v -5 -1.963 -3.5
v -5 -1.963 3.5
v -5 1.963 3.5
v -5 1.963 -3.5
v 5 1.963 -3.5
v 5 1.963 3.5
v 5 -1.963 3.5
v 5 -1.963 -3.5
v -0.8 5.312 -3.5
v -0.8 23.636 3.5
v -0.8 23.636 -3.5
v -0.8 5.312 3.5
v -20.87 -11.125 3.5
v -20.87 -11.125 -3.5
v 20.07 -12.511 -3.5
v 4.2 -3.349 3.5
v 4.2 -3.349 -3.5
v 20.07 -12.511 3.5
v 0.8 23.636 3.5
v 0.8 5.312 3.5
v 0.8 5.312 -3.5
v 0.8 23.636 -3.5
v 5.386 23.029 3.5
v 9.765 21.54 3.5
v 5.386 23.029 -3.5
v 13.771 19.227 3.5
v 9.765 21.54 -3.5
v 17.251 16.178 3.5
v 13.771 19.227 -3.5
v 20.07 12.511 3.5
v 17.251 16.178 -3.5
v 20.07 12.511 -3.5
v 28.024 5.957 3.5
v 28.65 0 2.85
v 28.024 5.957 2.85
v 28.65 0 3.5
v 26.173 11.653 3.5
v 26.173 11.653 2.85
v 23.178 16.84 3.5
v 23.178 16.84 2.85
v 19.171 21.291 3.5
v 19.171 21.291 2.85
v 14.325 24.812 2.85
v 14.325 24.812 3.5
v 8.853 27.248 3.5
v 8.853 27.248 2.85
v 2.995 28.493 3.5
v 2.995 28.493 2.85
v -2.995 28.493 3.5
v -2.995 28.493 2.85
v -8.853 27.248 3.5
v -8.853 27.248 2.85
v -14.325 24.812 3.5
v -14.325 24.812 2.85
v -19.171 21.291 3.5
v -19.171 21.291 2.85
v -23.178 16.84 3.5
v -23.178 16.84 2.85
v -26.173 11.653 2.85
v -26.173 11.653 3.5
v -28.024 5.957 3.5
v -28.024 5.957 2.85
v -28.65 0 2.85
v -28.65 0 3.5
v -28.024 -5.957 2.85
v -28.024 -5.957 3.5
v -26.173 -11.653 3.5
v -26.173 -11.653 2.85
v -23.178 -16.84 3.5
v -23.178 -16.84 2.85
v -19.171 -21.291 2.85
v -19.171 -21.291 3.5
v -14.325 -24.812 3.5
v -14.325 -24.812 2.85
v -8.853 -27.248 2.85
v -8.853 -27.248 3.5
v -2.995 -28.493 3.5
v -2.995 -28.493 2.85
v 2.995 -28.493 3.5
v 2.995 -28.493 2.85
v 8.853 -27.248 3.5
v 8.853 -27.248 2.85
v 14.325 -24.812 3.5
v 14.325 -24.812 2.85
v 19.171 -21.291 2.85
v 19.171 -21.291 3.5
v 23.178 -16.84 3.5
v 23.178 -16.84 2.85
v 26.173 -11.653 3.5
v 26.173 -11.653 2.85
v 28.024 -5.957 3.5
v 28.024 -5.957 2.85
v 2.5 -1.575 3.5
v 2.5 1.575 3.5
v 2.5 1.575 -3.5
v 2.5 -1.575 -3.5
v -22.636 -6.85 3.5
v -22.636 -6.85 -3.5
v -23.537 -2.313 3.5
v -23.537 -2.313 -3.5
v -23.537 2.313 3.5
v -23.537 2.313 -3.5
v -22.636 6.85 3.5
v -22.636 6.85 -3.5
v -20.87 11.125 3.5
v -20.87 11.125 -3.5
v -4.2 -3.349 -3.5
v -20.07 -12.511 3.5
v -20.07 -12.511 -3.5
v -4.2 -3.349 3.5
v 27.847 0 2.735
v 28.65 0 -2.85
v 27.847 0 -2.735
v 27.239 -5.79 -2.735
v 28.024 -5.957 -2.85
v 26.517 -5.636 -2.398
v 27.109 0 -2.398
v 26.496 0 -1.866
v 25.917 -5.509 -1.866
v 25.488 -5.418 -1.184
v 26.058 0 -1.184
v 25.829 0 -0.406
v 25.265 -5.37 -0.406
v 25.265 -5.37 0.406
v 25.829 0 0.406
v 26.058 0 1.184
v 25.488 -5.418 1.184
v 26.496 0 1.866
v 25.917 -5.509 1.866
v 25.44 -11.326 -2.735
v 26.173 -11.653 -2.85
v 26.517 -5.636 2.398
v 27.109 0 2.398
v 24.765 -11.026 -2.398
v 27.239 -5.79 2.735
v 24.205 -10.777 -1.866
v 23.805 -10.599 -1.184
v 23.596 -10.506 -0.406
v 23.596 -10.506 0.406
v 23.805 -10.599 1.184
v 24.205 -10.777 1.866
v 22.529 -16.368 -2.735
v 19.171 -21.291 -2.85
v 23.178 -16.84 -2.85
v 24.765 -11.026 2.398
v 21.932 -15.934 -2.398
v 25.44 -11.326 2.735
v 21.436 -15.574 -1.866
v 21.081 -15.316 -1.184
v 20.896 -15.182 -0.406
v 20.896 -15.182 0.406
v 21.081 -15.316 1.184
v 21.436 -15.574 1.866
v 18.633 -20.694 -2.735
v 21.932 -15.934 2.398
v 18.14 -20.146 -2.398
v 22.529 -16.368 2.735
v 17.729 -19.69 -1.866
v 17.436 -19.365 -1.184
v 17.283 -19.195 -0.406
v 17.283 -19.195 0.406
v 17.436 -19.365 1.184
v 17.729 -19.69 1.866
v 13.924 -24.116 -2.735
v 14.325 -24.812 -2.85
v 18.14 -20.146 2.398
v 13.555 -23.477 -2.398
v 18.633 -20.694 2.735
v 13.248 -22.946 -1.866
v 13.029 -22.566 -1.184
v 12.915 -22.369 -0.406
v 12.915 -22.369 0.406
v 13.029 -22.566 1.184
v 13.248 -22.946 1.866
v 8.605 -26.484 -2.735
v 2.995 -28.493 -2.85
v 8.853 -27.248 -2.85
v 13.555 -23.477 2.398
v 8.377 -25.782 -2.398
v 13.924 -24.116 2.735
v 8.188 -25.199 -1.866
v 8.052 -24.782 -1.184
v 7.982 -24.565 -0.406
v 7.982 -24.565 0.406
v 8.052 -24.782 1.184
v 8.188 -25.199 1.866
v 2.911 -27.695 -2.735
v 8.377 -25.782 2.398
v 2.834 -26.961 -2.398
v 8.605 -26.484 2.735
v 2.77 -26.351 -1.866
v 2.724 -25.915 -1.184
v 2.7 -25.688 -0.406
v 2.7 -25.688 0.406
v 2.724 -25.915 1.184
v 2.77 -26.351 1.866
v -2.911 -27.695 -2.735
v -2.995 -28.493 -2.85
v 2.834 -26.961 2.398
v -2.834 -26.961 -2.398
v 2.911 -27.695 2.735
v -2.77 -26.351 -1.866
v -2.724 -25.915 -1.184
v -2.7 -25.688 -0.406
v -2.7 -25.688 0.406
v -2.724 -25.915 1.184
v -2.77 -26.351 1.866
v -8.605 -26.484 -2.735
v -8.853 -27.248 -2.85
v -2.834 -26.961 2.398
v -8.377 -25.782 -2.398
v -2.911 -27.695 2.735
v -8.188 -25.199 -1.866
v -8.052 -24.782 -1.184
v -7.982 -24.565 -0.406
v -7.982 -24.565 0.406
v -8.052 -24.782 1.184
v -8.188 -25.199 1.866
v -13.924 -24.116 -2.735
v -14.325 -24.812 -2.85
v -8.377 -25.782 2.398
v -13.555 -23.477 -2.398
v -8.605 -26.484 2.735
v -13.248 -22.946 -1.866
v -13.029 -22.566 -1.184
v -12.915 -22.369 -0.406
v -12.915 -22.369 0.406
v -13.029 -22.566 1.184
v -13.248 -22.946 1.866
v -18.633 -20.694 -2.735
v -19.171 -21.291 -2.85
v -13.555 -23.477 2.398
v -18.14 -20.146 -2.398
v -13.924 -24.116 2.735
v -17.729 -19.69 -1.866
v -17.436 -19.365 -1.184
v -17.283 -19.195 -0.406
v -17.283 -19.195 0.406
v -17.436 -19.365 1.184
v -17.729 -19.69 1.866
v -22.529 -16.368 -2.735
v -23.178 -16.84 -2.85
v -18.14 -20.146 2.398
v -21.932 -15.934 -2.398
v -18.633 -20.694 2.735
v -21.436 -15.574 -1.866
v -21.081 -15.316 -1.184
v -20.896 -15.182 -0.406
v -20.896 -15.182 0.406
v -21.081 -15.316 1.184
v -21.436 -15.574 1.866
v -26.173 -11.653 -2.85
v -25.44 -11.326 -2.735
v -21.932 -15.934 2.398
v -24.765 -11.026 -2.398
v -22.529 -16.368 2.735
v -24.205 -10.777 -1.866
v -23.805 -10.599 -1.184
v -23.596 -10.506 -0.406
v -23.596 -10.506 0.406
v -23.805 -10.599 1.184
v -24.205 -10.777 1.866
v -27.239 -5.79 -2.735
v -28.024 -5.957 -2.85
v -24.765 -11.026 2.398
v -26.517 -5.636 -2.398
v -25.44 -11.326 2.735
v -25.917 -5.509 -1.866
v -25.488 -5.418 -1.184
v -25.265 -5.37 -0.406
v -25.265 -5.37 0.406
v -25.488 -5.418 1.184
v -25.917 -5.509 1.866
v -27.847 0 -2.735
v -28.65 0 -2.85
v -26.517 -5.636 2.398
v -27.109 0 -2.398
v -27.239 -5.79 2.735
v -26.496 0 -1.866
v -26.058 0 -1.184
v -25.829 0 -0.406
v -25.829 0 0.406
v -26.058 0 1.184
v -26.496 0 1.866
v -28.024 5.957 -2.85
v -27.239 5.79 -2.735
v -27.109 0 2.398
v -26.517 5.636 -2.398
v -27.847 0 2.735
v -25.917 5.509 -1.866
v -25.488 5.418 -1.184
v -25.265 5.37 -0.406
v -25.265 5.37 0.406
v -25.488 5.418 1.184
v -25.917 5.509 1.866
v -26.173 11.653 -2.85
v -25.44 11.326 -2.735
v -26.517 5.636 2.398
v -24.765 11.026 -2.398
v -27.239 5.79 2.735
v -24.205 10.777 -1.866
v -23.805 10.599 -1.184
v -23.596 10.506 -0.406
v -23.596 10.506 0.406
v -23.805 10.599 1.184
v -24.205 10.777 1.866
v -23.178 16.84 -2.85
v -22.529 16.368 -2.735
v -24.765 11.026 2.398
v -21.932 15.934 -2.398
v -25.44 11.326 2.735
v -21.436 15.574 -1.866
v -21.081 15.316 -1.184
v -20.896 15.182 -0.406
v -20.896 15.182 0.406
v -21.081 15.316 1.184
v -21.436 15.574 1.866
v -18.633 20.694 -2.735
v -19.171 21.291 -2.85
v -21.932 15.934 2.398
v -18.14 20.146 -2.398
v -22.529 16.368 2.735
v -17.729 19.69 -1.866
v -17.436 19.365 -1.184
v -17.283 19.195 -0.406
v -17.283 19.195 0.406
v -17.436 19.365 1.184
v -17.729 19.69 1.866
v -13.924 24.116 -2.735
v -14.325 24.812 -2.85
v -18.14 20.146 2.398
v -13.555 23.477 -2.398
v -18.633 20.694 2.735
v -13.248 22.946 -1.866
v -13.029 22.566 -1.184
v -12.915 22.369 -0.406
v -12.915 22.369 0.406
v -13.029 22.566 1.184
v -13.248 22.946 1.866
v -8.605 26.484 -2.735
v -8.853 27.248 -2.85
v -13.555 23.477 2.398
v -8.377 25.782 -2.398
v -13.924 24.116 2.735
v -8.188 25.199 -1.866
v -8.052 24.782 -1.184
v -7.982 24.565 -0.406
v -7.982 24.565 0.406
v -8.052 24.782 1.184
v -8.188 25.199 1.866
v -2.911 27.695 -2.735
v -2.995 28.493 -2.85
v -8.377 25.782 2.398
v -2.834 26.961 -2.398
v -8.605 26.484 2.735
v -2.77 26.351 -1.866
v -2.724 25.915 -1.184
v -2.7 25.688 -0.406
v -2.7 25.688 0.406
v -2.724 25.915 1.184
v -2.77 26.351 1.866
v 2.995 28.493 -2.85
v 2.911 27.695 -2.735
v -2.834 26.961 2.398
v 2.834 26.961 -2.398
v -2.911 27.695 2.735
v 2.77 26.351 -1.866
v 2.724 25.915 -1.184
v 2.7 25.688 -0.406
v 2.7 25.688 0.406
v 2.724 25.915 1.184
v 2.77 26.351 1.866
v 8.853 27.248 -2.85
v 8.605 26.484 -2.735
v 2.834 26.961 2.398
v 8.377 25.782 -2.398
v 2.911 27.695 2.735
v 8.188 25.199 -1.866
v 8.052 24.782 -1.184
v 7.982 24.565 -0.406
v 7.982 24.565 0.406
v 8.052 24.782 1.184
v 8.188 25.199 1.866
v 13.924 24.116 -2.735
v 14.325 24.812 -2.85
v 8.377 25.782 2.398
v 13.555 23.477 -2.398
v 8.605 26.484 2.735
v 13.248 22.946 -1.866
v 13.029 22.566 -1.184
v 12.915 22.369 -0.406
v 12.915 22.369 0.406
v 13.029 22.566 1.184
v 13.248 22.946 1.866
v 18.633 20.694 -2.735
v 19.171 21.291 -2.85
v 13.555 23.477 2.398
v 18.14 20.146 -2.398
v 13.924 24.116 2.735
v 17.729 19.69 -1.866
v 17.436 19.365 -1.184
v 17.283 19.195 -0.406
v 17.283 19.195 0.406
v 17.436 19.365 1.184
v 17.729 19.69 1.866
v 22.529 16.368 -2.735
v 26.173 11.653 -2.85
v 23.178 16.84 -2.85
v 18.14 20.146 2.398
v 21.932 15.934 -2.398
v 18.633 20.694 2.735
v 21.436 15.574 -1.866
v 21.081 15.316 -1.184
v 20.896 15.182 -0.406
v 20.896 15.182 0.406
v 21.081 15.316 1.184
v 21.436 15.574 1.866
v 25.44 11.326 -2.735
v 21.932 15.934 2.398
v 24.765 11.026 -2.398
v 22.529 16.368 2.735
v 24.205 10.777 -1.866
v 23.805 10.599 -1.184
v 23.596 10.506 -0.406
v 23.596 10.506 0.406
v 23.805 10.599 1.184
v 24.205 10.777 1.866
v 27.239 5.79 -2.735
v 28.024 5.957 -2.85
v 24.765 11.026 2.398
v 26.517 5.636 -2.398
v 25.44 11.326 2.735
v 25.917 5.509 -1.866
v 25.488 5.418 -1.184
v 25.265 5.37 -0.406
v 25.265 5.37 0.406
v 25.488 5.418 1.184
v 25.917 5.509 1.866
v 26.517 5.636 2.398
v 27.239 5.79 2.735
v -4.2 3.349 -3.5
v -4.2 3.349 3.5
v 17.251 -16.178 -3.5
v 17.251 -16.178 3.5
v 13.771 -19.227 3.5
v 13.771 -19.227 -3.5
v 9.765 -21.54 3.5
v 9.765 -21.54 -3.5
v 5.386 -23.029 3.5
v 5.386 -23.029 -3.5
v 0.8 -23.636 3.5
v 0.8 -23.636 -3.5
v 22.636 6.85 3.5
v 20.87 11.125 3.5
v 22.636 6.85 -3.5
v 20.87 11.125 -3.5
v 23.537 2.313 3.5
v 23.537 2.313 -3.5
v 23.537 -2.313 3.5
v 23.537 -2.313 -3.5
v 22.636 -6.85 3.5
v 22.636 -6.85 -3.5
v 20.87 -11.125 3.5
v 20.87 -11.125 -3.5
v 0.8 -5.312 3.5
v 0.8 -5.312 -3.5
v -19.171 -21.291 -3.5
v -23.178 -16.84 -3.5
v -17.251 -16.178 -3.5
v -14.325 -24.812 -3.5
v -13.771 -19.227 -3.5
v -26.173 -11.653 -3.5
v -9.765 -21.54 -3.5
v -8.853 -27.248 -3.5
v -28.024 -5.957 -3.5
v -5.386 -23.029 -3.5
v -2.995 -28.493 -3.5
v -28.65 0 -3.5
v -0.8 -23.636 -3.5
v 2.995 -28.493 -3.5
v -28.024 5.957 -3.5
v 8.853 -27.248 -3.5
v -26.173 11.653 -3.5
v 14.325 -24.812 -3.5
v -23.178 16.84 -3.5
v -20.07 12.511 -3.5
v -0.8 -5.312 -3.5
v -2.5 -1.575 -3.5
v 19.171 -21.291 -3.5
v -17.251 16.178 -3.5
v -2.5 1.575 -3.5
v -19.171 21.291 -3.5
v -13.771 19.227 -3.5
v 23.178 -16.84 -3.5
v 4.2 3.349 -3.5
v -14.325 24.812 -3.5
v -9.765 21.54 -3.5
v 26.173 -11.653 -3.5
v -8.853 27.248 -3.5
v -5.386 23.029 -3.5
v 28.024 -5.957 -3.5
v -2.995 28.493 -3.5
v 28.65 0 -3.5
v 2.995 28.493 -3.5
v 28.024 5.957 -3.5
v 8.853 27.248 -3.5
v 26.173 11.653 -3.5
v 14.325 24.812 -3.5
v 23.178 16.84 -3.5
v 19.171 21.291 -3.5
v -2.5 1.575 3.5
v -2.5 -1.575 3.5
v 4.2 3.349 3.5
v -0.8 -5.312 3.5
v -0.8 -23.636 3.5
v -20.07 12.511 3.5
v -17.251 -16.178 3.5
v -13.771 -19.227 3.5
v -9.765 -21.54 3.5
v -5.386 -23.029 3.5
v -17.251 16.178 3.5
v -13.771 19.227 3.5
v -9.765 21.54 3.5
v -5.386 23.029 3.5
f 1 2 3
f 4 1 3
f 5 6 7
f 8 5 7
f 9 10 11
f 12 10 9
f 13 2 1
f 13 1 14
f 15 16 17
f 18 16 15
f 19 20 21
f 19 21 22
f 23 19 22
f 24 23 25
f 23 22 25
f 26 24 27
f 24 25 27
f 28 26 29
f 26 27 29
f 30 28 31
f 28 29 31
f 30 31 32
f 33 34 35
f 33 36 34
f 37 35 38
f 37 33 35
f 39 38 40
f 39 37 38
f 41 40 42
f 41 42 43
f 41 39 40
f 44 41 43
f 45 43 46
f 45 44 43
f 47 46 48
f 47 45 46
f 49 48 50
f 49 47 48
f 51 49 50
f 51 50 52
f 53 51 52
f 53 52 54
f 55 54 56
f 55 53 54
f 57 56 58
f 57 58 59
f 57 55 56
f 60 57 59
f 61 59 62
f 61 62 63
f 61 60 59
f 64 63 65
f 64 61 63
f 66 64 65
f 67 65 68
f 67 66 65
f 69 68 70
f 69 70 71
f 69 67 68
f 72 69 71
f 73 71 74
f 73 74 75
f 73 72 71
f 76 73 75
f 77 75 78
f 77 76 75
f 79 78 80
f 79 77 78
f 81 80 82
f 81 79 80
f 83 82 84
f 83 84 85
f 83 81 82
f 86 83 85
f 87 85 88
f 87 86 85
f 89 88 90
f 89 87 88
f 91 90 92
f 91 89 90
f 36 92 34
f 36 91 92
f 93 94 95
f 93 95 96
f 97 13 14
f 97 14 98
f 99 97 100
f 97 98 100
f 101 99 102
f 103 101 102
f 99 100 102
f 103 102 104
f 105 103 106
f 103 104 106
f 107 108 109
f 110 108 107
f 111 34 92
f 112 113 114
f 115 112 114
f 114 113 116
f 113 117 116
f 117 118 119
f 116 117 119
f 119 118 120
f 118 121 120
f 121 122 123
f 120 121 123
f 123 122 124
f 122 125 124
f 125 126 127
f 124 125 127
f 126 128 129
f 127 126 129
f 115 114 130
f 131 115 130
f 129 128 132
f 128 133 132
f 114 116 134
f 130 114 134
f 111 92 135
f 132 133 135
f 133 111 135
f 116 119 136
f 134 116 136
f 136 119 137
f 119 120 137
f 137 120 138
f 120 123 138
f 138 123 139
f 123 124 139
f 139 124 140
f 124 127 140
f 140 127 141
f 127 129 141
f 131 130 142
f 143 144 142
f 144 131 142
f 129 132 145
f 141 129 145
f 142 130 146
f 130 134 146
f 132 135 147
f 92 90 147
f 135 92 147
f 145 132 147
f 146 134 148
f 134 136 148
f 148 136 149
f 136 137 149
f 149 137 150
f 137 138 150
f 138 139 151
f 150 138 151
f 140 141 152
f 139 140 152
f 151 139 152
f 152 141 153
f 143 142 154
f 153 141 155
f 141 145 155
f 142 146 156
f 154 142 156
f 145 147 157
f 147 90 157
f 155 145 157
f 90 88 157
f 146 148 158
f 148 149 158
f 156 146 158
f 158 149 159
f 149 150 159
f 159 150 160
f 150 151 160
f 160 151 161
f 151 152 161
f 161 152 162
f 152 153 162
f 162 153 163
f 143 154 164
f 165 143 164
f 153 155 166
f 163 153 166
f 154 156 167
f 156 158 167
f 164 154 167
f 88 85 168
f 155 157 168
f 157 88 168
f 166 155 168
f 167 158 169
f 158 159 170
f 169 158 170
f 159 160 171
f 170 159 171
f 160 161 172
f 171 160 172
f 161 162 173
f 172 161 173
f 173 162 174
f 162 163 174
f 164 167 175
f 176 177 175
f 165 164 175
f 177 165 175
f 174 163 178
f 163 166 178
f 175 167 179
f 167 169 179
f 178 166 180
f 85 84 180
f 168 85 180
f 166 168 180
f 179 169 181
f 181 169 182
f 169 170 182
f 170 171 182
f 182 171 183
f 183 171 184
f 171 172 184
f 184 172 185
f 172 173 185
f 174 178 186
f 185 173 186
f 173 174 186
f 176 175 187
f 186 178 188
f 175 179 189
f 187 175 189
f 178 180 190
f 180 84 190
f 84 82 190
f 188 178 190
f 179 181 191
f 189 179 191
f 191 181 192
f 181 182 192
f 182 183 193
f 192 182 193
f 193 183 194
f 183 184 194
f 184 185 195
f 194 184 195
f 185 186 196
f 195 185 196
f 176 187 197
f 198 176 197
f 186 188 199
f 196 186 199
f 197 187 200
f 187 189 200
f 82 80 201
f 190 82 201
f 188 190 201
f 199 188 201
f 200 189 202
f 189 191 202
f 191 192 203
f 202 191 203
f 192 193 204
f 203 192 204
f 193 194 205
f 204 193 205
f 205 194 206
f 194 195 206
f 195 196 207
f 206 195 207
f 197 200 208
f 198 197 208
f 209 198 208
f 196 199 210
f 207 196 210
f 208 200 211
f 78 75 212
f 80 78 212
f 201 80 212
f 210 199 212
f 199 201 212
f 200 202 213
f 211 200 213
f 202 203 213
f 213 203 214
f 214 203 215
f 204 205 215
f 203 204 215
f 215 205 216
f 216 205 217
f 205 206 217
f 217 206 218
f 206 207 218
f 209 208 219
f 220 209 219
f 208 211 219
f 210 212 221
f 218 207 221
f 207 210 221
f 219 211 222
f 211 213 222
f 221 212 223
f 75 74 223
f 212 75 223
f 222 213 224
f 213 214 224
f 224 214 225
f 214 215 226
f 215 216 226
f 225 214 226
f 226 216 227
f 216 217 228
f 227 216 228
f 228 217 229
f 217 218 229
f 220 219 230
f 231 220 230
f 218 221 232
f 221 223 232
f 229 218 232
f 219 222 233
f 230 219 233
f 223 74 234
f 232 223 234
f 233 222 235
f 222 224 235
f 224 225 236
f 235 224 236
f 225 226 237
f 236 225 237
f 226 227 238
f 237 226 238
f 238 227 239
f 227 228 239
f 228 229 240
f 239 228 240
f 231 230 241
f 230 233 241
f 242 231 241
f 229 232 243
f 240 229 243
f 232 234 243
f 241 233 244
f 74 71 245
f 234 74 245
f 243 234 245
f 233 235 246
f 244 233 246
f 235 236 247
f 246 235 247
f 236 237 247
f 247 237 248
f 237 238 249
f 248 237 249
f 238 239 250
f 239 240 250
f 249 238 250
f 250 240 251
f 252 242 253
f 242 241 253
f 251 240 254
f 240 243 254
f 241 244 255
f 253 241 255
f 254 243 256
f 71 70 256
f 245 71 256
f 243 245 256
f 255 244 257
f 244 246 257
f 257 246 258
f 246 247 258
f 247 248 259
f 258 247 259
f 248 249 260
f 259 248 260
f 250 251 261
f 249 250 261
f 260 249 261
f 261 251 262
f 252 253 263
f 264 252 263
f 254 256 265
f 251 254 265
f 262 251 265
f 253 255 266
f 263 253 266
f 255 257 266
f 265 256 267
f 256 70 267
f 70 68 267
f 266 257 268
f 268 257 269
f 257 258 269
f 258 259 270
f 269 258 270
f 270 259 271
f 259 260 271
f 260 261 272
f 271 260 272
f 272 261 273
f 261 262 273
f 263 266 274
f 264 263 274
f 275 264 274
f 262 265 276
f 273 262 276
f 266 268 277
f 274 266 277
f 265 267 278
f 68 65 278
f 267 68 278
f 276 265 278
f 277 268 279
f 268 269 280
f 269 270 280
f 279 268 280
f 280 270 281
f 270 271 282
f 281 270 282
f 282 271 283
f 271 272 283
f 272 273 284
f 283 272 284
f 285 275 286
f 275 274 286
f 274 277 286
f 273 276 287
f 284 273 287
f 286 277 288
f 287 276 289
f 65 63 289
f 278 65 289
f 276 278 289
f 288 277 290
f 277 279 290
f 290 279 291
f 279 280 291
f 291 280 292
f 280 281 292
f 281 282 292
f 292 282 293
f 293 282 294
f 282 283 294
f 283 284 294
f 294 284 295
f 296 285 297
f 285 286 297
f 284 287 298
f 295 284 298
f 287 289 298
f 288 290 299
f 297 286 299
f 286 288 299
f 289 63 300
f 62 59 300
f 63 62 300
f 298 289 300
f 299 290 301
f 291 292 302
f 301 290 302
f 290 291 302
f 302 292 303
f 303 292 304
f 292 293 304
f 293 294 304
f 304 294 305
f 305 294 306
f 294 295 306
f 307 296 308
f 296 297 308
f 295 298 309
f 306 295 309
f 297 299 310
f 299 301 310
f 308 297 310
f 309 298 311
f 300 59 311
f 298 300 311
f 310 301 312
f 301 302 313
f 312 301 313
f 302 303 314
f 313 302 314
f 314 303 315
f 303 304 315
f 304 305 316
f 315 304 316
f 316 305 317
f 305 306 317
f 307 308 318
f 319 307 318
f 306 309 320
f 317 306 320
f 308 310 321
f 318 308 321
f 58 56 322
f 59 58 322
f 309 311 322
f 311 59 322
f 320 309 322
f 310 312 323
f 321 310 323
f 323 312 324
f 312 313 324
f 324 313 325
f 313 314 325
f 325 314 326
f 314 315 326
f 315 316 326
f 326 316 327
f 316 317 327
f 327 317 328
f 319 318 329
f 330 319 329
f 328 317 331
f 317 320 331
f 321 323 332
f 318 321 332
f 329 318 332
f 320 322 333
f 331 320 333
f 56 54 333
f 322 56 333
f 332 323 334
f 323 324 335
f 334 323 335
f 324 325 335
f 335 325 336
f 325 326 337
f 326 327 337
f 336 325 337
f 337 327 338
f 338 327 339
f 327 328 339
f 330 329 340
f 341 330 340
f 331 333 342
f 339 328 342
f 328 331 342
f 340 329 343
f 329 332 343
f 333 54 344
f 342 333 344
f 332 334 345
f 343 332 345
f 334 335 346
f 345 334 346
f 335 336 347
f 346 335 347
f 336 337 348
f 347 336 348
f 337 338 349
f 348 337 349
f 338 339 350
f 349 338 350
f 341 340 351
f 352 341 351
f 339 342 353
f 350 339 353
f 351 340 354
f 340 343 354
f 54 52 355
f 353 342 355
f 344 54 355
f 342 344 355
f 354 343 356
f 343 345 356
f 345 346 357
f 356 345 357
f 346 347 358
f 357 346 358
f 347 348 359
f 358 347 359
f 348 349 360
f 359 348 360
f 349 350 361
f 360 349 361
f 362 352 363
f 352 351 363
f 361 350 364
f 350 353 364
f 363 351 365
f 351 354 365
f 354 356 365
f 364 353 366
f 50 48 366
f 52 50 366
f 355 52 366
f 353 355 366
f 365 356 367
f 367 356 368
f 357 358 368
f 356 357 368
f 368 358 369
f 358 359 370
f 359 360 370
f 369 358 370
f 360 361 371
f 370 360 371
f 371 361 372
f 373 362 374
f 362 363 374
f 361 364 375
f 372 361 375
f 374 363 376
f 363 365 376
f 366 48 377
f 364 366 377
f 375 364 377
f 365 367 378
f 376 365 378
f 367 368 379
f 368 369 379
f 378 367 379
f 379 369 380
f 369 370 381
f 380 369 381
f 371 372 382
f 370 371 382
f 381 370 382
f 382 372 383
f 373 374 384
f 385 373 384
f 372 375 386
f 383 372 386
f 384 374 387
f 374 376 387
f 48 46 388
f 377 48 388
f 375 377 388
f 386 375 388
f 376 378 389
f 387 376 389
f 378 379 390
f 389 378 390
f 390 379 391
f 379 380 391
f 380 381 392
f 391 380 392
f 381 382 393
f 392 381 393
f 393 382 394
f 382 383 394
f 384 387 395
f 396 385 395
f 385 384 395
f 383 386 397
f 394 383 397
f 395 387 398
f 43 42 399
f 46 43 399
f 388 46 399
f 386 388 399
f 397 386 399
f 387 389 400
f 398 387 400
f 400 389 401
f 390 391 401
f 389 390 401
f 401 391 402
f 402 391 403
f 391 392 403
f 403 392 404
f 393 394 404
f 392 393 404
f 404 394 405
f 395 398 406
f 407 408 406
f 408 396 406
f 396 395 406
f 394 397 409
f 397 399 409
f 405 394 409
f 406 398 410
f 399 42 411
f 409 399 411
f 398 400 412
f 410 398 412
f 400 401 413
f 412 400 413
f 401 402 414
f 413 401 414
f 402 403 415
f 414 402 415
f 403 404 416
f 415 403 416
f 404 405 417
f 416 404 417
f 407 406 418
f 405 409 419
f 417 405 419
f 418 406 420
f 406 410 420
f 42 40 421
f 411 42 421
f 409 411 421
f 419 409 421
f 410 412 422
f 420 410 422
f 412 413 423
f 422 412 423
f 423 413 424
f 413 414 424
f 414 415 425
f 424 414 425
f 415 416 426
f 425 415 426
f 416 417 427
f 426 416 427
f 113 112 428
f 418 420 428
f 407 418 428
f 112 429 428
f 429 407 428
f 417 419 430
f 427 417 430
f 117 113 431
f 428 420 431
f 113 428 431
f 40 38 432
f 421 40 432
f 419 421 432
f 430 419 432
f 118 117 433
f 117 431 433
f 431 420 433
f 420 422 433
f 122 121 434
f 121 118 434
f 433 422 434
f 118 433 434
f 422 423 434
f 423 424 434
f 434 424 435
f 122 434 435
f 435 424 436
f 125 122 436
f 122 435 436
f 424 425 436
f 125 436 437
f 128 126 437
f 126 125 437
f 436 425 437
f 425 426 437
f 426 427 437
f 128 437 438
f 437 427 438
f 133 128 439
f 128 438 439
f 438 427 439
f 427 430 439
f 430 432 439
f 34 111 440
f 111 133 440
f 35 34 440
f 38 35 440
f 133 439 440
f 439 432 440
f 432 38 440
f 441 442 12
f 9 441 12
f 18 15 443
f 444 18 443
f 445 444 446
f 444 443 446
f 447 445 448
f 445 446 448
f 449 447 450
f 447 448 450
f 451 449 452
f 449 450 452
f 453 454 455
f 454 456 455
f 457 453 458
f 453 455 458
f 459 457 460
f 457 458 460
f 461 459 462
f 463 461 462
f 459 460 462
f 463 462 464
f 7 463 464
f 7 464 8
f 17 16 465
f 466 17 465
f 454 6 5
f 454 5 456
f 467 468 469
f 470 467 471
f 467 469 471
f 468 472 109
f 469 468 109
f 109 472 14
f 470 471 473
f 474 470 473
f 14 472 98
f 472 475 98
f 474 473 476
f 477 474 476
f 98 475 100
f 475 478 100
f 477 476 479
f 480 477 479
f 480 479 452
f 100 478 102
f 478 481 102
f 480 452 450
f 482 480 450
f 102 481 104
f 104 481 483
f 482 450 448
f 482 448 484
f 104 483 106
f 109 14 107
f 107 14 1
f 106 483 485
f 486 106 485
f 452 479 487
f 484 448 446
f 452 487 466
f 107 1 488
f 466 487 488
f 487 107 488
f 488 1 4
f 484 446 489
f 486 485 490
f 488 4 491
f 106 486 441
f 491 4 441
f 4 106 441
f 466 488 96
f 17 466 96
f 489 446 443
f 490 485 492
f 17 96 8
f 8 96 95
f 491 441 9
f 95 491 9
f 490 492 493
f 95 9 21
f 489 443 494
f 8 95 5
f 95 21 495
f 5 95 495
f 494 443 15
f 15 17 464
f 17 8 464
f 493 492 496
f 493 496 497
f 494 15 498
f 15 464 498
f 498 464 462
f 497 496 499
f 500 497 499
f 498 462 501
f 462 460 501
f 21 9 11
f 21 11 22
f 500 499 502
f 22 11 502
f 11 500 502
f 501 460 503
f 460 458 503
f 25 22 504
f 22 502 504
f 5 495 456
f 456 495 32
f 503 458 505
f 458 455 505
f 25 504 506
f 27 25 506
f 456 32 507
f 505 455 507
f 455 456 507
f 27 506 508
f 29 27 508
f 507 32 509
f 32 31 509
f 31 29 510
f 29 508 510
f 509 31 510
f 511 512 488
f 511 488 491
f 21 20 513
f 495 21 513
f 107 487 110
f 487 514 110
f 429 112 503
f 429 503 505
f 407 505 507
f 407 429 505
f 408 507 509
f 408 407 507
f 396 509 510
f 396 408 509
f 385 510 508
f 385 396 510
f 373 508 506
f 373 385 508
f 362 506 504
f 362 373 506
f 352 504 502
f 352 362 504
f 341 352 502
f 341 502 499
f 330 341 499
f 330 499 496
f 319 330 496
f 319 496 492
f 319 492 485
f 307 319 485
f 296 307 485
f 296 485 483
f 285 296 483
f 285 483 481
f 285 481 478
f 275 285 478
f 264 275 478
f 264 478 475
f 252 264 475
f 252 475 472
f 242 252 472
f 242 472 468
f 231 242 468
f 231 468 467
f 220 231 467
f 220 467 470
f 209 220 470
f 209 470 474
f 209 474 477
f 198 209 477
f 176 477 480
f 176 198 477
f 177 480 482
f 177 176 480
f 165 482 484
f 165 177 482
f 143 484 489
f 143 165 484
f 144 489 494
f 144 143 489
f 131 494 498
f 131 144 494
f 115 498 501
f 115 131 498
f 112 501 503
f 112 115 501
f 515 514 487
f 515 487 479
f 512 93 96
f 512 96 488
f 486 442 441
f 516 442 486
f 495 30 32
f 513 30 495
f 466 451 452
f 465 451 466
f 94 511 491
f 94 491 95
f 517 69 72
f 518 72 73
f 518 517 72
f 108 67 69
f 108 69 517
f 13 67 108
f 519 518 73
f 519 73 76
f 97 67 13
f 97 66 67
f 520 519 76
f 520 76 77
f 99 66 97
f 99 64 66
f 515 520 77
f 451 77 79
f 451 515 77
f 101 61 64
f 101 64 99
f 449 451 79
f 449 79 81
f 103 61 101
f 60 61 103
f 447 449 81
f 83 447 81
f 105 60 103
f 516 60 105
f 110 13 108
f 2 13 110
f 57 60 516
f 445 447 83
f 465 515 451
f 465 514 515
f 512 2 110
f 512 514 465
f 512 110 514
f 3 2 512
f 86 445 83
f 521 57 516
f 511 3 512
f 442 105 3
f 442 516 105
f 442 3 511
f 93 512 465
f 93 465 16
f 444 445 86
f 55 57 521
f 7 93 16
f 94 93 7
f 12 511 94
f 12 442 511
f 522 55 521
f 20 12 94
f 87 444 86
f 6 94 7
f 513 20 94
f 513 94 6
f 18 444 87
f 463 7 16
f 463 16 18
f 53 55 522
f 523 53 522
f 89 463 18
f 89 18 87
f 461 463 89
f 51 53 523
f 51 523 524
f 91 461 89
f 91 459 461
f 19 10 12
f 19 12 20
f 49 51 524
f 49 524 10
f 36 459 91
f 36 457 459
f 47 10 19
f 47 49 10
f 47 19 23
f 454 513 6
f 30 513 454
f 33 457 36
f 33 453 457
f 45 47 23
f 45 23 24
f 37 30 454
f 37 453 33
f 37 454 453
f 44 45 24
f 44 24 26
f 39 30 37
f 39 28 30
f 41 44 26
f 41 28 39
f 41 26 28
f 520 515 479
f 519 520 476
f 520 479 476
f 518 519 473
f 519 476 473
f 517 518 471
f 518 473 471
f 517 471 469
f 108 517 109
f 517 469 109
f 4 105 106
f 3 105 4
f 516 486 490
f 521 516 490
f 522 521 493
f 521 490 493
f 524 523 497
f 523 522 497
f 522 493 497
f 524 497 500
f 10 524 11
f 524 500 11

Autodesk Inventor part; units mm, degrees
ref_plane "YZ Plane" through (0, 0, 0) normal (1, 0, 0) x (0, 1, 0)
ref_plane "XZ Plane" through (0, 0, 0) normal (0, 1, 0) x (-1, 0, 0)
ref_plane "XY Plane" through (0, 0, 0) normal (0, 0, 1) x (1, 0, 0)
sketch "スケッチ1" plane through (0, 0, 0) normal (0, 1, 0) x (-1, 0, 0)
  line L0 (0, 0) -> (-64.0652, 0) construction
  circle A0 centre (-28.65, 0) radius 2.85
  line L1 (-23.65, -3.5) -> (-28.65, -3.5)
  line L2 (-28.65, -3.5) -> (-28.65, 3.5)
  line L3 (-28.65, 3.5) -> (-23.65, 3.5)
  line L4 (-23.65, 3.5) -> (-23.65, -3.5)
  line L5 (0, -4.9) -> (0, 4.9) projected
  point P0 (-28.65, 2.85)
  point P1 (-28.65, -2.85)
  dimension "P_DIA" = 5.7
  dimension "P_D1" = 28.65
  dimension "d2" = 7
  dimension "d3" = 5
revolve "リム" add sketch "スケッチ1" angle 360 about axis through (0, 0, -10) along (0, 0, 1) contours A0 L2 L3 L4 L1
sketch "スケッチ3" plane through (0, 0, 3.5) normal (0, 0, 1) x (1, 0, 0)
  line L0 (-5, 2.8868) -> (0, 5.7735)
  line L1 (0, 5.7735) -> (5, 2.8868)
  line L2 (5, 2.8868) -> (5, -2.8868)
  line L3 (5, -2.8868) -> (0, -5.7735)
  line L4 (0, -5.7735) -> (-5, -2.8868)
  line L5 (-5, -2.8868) -> (-5, 2.8868)
  point P0 (0, 0)
  point P1 (0, 0)
  dimension "HUB_DIA" = 10
extrude "ハブ" add sketch "スケッチ3" against normal up to surface (7 mm away)
sketch "スケッチ4" plane through (0, 0, 3.5) normal (0, 0, 1) x (1, 0, 0)
  line L0 (-0.8, 0) -> (0.8, 0)
  line L1 (0.8, 0) -> (0.8, 23.65)
  line L2 (0.8, 23.65) -> (-0.8, 23.65)
  line L3 (-0.8, 23.65) -> (-0.8, 0)
  circle A0 centre (0, 0) radius 23.65 projected
  point P0 (0, 23.65)
  dimension "SPOKE_THIN" = 1.6
extrude "スポーク" add sketch "スケッチ4" against normal up to surface (7 mm away) contours L3 A0 L1 L0 | L3 L2 A0 | A0 L2 L1 picked at (0, 7.8833)
pattern_circular "円形状パターン1" count 6 over 360 about axis through (0, 0, -10) along (0, 0, 1) of "スポーク"
sketch "スケッチ5" plane through (0, 0, 3.5) normal (0, 0, 1) x (1, 0, 0)
  line L0 (-2.5, 1.575) -> (2.5, 1.575)
  line L1 (2.5, 1.575) -> (2.5, -1.575)
  line L2 (2.5, -1.575) -> (-2.5, -1.575)
  line L3 (-2.5, -1.575) -> (-2.5, 1.575)
  point P0 (0, 0)
  point P1 (0, 1.575)
  point P2 (-2.5, 0)
  dimension "d15" = 5
  dimension "d16" = 3.15
extrude "軸穴" cut sketch "スケッチ5" against normal through all
properties part number "Wheel-D63C"
